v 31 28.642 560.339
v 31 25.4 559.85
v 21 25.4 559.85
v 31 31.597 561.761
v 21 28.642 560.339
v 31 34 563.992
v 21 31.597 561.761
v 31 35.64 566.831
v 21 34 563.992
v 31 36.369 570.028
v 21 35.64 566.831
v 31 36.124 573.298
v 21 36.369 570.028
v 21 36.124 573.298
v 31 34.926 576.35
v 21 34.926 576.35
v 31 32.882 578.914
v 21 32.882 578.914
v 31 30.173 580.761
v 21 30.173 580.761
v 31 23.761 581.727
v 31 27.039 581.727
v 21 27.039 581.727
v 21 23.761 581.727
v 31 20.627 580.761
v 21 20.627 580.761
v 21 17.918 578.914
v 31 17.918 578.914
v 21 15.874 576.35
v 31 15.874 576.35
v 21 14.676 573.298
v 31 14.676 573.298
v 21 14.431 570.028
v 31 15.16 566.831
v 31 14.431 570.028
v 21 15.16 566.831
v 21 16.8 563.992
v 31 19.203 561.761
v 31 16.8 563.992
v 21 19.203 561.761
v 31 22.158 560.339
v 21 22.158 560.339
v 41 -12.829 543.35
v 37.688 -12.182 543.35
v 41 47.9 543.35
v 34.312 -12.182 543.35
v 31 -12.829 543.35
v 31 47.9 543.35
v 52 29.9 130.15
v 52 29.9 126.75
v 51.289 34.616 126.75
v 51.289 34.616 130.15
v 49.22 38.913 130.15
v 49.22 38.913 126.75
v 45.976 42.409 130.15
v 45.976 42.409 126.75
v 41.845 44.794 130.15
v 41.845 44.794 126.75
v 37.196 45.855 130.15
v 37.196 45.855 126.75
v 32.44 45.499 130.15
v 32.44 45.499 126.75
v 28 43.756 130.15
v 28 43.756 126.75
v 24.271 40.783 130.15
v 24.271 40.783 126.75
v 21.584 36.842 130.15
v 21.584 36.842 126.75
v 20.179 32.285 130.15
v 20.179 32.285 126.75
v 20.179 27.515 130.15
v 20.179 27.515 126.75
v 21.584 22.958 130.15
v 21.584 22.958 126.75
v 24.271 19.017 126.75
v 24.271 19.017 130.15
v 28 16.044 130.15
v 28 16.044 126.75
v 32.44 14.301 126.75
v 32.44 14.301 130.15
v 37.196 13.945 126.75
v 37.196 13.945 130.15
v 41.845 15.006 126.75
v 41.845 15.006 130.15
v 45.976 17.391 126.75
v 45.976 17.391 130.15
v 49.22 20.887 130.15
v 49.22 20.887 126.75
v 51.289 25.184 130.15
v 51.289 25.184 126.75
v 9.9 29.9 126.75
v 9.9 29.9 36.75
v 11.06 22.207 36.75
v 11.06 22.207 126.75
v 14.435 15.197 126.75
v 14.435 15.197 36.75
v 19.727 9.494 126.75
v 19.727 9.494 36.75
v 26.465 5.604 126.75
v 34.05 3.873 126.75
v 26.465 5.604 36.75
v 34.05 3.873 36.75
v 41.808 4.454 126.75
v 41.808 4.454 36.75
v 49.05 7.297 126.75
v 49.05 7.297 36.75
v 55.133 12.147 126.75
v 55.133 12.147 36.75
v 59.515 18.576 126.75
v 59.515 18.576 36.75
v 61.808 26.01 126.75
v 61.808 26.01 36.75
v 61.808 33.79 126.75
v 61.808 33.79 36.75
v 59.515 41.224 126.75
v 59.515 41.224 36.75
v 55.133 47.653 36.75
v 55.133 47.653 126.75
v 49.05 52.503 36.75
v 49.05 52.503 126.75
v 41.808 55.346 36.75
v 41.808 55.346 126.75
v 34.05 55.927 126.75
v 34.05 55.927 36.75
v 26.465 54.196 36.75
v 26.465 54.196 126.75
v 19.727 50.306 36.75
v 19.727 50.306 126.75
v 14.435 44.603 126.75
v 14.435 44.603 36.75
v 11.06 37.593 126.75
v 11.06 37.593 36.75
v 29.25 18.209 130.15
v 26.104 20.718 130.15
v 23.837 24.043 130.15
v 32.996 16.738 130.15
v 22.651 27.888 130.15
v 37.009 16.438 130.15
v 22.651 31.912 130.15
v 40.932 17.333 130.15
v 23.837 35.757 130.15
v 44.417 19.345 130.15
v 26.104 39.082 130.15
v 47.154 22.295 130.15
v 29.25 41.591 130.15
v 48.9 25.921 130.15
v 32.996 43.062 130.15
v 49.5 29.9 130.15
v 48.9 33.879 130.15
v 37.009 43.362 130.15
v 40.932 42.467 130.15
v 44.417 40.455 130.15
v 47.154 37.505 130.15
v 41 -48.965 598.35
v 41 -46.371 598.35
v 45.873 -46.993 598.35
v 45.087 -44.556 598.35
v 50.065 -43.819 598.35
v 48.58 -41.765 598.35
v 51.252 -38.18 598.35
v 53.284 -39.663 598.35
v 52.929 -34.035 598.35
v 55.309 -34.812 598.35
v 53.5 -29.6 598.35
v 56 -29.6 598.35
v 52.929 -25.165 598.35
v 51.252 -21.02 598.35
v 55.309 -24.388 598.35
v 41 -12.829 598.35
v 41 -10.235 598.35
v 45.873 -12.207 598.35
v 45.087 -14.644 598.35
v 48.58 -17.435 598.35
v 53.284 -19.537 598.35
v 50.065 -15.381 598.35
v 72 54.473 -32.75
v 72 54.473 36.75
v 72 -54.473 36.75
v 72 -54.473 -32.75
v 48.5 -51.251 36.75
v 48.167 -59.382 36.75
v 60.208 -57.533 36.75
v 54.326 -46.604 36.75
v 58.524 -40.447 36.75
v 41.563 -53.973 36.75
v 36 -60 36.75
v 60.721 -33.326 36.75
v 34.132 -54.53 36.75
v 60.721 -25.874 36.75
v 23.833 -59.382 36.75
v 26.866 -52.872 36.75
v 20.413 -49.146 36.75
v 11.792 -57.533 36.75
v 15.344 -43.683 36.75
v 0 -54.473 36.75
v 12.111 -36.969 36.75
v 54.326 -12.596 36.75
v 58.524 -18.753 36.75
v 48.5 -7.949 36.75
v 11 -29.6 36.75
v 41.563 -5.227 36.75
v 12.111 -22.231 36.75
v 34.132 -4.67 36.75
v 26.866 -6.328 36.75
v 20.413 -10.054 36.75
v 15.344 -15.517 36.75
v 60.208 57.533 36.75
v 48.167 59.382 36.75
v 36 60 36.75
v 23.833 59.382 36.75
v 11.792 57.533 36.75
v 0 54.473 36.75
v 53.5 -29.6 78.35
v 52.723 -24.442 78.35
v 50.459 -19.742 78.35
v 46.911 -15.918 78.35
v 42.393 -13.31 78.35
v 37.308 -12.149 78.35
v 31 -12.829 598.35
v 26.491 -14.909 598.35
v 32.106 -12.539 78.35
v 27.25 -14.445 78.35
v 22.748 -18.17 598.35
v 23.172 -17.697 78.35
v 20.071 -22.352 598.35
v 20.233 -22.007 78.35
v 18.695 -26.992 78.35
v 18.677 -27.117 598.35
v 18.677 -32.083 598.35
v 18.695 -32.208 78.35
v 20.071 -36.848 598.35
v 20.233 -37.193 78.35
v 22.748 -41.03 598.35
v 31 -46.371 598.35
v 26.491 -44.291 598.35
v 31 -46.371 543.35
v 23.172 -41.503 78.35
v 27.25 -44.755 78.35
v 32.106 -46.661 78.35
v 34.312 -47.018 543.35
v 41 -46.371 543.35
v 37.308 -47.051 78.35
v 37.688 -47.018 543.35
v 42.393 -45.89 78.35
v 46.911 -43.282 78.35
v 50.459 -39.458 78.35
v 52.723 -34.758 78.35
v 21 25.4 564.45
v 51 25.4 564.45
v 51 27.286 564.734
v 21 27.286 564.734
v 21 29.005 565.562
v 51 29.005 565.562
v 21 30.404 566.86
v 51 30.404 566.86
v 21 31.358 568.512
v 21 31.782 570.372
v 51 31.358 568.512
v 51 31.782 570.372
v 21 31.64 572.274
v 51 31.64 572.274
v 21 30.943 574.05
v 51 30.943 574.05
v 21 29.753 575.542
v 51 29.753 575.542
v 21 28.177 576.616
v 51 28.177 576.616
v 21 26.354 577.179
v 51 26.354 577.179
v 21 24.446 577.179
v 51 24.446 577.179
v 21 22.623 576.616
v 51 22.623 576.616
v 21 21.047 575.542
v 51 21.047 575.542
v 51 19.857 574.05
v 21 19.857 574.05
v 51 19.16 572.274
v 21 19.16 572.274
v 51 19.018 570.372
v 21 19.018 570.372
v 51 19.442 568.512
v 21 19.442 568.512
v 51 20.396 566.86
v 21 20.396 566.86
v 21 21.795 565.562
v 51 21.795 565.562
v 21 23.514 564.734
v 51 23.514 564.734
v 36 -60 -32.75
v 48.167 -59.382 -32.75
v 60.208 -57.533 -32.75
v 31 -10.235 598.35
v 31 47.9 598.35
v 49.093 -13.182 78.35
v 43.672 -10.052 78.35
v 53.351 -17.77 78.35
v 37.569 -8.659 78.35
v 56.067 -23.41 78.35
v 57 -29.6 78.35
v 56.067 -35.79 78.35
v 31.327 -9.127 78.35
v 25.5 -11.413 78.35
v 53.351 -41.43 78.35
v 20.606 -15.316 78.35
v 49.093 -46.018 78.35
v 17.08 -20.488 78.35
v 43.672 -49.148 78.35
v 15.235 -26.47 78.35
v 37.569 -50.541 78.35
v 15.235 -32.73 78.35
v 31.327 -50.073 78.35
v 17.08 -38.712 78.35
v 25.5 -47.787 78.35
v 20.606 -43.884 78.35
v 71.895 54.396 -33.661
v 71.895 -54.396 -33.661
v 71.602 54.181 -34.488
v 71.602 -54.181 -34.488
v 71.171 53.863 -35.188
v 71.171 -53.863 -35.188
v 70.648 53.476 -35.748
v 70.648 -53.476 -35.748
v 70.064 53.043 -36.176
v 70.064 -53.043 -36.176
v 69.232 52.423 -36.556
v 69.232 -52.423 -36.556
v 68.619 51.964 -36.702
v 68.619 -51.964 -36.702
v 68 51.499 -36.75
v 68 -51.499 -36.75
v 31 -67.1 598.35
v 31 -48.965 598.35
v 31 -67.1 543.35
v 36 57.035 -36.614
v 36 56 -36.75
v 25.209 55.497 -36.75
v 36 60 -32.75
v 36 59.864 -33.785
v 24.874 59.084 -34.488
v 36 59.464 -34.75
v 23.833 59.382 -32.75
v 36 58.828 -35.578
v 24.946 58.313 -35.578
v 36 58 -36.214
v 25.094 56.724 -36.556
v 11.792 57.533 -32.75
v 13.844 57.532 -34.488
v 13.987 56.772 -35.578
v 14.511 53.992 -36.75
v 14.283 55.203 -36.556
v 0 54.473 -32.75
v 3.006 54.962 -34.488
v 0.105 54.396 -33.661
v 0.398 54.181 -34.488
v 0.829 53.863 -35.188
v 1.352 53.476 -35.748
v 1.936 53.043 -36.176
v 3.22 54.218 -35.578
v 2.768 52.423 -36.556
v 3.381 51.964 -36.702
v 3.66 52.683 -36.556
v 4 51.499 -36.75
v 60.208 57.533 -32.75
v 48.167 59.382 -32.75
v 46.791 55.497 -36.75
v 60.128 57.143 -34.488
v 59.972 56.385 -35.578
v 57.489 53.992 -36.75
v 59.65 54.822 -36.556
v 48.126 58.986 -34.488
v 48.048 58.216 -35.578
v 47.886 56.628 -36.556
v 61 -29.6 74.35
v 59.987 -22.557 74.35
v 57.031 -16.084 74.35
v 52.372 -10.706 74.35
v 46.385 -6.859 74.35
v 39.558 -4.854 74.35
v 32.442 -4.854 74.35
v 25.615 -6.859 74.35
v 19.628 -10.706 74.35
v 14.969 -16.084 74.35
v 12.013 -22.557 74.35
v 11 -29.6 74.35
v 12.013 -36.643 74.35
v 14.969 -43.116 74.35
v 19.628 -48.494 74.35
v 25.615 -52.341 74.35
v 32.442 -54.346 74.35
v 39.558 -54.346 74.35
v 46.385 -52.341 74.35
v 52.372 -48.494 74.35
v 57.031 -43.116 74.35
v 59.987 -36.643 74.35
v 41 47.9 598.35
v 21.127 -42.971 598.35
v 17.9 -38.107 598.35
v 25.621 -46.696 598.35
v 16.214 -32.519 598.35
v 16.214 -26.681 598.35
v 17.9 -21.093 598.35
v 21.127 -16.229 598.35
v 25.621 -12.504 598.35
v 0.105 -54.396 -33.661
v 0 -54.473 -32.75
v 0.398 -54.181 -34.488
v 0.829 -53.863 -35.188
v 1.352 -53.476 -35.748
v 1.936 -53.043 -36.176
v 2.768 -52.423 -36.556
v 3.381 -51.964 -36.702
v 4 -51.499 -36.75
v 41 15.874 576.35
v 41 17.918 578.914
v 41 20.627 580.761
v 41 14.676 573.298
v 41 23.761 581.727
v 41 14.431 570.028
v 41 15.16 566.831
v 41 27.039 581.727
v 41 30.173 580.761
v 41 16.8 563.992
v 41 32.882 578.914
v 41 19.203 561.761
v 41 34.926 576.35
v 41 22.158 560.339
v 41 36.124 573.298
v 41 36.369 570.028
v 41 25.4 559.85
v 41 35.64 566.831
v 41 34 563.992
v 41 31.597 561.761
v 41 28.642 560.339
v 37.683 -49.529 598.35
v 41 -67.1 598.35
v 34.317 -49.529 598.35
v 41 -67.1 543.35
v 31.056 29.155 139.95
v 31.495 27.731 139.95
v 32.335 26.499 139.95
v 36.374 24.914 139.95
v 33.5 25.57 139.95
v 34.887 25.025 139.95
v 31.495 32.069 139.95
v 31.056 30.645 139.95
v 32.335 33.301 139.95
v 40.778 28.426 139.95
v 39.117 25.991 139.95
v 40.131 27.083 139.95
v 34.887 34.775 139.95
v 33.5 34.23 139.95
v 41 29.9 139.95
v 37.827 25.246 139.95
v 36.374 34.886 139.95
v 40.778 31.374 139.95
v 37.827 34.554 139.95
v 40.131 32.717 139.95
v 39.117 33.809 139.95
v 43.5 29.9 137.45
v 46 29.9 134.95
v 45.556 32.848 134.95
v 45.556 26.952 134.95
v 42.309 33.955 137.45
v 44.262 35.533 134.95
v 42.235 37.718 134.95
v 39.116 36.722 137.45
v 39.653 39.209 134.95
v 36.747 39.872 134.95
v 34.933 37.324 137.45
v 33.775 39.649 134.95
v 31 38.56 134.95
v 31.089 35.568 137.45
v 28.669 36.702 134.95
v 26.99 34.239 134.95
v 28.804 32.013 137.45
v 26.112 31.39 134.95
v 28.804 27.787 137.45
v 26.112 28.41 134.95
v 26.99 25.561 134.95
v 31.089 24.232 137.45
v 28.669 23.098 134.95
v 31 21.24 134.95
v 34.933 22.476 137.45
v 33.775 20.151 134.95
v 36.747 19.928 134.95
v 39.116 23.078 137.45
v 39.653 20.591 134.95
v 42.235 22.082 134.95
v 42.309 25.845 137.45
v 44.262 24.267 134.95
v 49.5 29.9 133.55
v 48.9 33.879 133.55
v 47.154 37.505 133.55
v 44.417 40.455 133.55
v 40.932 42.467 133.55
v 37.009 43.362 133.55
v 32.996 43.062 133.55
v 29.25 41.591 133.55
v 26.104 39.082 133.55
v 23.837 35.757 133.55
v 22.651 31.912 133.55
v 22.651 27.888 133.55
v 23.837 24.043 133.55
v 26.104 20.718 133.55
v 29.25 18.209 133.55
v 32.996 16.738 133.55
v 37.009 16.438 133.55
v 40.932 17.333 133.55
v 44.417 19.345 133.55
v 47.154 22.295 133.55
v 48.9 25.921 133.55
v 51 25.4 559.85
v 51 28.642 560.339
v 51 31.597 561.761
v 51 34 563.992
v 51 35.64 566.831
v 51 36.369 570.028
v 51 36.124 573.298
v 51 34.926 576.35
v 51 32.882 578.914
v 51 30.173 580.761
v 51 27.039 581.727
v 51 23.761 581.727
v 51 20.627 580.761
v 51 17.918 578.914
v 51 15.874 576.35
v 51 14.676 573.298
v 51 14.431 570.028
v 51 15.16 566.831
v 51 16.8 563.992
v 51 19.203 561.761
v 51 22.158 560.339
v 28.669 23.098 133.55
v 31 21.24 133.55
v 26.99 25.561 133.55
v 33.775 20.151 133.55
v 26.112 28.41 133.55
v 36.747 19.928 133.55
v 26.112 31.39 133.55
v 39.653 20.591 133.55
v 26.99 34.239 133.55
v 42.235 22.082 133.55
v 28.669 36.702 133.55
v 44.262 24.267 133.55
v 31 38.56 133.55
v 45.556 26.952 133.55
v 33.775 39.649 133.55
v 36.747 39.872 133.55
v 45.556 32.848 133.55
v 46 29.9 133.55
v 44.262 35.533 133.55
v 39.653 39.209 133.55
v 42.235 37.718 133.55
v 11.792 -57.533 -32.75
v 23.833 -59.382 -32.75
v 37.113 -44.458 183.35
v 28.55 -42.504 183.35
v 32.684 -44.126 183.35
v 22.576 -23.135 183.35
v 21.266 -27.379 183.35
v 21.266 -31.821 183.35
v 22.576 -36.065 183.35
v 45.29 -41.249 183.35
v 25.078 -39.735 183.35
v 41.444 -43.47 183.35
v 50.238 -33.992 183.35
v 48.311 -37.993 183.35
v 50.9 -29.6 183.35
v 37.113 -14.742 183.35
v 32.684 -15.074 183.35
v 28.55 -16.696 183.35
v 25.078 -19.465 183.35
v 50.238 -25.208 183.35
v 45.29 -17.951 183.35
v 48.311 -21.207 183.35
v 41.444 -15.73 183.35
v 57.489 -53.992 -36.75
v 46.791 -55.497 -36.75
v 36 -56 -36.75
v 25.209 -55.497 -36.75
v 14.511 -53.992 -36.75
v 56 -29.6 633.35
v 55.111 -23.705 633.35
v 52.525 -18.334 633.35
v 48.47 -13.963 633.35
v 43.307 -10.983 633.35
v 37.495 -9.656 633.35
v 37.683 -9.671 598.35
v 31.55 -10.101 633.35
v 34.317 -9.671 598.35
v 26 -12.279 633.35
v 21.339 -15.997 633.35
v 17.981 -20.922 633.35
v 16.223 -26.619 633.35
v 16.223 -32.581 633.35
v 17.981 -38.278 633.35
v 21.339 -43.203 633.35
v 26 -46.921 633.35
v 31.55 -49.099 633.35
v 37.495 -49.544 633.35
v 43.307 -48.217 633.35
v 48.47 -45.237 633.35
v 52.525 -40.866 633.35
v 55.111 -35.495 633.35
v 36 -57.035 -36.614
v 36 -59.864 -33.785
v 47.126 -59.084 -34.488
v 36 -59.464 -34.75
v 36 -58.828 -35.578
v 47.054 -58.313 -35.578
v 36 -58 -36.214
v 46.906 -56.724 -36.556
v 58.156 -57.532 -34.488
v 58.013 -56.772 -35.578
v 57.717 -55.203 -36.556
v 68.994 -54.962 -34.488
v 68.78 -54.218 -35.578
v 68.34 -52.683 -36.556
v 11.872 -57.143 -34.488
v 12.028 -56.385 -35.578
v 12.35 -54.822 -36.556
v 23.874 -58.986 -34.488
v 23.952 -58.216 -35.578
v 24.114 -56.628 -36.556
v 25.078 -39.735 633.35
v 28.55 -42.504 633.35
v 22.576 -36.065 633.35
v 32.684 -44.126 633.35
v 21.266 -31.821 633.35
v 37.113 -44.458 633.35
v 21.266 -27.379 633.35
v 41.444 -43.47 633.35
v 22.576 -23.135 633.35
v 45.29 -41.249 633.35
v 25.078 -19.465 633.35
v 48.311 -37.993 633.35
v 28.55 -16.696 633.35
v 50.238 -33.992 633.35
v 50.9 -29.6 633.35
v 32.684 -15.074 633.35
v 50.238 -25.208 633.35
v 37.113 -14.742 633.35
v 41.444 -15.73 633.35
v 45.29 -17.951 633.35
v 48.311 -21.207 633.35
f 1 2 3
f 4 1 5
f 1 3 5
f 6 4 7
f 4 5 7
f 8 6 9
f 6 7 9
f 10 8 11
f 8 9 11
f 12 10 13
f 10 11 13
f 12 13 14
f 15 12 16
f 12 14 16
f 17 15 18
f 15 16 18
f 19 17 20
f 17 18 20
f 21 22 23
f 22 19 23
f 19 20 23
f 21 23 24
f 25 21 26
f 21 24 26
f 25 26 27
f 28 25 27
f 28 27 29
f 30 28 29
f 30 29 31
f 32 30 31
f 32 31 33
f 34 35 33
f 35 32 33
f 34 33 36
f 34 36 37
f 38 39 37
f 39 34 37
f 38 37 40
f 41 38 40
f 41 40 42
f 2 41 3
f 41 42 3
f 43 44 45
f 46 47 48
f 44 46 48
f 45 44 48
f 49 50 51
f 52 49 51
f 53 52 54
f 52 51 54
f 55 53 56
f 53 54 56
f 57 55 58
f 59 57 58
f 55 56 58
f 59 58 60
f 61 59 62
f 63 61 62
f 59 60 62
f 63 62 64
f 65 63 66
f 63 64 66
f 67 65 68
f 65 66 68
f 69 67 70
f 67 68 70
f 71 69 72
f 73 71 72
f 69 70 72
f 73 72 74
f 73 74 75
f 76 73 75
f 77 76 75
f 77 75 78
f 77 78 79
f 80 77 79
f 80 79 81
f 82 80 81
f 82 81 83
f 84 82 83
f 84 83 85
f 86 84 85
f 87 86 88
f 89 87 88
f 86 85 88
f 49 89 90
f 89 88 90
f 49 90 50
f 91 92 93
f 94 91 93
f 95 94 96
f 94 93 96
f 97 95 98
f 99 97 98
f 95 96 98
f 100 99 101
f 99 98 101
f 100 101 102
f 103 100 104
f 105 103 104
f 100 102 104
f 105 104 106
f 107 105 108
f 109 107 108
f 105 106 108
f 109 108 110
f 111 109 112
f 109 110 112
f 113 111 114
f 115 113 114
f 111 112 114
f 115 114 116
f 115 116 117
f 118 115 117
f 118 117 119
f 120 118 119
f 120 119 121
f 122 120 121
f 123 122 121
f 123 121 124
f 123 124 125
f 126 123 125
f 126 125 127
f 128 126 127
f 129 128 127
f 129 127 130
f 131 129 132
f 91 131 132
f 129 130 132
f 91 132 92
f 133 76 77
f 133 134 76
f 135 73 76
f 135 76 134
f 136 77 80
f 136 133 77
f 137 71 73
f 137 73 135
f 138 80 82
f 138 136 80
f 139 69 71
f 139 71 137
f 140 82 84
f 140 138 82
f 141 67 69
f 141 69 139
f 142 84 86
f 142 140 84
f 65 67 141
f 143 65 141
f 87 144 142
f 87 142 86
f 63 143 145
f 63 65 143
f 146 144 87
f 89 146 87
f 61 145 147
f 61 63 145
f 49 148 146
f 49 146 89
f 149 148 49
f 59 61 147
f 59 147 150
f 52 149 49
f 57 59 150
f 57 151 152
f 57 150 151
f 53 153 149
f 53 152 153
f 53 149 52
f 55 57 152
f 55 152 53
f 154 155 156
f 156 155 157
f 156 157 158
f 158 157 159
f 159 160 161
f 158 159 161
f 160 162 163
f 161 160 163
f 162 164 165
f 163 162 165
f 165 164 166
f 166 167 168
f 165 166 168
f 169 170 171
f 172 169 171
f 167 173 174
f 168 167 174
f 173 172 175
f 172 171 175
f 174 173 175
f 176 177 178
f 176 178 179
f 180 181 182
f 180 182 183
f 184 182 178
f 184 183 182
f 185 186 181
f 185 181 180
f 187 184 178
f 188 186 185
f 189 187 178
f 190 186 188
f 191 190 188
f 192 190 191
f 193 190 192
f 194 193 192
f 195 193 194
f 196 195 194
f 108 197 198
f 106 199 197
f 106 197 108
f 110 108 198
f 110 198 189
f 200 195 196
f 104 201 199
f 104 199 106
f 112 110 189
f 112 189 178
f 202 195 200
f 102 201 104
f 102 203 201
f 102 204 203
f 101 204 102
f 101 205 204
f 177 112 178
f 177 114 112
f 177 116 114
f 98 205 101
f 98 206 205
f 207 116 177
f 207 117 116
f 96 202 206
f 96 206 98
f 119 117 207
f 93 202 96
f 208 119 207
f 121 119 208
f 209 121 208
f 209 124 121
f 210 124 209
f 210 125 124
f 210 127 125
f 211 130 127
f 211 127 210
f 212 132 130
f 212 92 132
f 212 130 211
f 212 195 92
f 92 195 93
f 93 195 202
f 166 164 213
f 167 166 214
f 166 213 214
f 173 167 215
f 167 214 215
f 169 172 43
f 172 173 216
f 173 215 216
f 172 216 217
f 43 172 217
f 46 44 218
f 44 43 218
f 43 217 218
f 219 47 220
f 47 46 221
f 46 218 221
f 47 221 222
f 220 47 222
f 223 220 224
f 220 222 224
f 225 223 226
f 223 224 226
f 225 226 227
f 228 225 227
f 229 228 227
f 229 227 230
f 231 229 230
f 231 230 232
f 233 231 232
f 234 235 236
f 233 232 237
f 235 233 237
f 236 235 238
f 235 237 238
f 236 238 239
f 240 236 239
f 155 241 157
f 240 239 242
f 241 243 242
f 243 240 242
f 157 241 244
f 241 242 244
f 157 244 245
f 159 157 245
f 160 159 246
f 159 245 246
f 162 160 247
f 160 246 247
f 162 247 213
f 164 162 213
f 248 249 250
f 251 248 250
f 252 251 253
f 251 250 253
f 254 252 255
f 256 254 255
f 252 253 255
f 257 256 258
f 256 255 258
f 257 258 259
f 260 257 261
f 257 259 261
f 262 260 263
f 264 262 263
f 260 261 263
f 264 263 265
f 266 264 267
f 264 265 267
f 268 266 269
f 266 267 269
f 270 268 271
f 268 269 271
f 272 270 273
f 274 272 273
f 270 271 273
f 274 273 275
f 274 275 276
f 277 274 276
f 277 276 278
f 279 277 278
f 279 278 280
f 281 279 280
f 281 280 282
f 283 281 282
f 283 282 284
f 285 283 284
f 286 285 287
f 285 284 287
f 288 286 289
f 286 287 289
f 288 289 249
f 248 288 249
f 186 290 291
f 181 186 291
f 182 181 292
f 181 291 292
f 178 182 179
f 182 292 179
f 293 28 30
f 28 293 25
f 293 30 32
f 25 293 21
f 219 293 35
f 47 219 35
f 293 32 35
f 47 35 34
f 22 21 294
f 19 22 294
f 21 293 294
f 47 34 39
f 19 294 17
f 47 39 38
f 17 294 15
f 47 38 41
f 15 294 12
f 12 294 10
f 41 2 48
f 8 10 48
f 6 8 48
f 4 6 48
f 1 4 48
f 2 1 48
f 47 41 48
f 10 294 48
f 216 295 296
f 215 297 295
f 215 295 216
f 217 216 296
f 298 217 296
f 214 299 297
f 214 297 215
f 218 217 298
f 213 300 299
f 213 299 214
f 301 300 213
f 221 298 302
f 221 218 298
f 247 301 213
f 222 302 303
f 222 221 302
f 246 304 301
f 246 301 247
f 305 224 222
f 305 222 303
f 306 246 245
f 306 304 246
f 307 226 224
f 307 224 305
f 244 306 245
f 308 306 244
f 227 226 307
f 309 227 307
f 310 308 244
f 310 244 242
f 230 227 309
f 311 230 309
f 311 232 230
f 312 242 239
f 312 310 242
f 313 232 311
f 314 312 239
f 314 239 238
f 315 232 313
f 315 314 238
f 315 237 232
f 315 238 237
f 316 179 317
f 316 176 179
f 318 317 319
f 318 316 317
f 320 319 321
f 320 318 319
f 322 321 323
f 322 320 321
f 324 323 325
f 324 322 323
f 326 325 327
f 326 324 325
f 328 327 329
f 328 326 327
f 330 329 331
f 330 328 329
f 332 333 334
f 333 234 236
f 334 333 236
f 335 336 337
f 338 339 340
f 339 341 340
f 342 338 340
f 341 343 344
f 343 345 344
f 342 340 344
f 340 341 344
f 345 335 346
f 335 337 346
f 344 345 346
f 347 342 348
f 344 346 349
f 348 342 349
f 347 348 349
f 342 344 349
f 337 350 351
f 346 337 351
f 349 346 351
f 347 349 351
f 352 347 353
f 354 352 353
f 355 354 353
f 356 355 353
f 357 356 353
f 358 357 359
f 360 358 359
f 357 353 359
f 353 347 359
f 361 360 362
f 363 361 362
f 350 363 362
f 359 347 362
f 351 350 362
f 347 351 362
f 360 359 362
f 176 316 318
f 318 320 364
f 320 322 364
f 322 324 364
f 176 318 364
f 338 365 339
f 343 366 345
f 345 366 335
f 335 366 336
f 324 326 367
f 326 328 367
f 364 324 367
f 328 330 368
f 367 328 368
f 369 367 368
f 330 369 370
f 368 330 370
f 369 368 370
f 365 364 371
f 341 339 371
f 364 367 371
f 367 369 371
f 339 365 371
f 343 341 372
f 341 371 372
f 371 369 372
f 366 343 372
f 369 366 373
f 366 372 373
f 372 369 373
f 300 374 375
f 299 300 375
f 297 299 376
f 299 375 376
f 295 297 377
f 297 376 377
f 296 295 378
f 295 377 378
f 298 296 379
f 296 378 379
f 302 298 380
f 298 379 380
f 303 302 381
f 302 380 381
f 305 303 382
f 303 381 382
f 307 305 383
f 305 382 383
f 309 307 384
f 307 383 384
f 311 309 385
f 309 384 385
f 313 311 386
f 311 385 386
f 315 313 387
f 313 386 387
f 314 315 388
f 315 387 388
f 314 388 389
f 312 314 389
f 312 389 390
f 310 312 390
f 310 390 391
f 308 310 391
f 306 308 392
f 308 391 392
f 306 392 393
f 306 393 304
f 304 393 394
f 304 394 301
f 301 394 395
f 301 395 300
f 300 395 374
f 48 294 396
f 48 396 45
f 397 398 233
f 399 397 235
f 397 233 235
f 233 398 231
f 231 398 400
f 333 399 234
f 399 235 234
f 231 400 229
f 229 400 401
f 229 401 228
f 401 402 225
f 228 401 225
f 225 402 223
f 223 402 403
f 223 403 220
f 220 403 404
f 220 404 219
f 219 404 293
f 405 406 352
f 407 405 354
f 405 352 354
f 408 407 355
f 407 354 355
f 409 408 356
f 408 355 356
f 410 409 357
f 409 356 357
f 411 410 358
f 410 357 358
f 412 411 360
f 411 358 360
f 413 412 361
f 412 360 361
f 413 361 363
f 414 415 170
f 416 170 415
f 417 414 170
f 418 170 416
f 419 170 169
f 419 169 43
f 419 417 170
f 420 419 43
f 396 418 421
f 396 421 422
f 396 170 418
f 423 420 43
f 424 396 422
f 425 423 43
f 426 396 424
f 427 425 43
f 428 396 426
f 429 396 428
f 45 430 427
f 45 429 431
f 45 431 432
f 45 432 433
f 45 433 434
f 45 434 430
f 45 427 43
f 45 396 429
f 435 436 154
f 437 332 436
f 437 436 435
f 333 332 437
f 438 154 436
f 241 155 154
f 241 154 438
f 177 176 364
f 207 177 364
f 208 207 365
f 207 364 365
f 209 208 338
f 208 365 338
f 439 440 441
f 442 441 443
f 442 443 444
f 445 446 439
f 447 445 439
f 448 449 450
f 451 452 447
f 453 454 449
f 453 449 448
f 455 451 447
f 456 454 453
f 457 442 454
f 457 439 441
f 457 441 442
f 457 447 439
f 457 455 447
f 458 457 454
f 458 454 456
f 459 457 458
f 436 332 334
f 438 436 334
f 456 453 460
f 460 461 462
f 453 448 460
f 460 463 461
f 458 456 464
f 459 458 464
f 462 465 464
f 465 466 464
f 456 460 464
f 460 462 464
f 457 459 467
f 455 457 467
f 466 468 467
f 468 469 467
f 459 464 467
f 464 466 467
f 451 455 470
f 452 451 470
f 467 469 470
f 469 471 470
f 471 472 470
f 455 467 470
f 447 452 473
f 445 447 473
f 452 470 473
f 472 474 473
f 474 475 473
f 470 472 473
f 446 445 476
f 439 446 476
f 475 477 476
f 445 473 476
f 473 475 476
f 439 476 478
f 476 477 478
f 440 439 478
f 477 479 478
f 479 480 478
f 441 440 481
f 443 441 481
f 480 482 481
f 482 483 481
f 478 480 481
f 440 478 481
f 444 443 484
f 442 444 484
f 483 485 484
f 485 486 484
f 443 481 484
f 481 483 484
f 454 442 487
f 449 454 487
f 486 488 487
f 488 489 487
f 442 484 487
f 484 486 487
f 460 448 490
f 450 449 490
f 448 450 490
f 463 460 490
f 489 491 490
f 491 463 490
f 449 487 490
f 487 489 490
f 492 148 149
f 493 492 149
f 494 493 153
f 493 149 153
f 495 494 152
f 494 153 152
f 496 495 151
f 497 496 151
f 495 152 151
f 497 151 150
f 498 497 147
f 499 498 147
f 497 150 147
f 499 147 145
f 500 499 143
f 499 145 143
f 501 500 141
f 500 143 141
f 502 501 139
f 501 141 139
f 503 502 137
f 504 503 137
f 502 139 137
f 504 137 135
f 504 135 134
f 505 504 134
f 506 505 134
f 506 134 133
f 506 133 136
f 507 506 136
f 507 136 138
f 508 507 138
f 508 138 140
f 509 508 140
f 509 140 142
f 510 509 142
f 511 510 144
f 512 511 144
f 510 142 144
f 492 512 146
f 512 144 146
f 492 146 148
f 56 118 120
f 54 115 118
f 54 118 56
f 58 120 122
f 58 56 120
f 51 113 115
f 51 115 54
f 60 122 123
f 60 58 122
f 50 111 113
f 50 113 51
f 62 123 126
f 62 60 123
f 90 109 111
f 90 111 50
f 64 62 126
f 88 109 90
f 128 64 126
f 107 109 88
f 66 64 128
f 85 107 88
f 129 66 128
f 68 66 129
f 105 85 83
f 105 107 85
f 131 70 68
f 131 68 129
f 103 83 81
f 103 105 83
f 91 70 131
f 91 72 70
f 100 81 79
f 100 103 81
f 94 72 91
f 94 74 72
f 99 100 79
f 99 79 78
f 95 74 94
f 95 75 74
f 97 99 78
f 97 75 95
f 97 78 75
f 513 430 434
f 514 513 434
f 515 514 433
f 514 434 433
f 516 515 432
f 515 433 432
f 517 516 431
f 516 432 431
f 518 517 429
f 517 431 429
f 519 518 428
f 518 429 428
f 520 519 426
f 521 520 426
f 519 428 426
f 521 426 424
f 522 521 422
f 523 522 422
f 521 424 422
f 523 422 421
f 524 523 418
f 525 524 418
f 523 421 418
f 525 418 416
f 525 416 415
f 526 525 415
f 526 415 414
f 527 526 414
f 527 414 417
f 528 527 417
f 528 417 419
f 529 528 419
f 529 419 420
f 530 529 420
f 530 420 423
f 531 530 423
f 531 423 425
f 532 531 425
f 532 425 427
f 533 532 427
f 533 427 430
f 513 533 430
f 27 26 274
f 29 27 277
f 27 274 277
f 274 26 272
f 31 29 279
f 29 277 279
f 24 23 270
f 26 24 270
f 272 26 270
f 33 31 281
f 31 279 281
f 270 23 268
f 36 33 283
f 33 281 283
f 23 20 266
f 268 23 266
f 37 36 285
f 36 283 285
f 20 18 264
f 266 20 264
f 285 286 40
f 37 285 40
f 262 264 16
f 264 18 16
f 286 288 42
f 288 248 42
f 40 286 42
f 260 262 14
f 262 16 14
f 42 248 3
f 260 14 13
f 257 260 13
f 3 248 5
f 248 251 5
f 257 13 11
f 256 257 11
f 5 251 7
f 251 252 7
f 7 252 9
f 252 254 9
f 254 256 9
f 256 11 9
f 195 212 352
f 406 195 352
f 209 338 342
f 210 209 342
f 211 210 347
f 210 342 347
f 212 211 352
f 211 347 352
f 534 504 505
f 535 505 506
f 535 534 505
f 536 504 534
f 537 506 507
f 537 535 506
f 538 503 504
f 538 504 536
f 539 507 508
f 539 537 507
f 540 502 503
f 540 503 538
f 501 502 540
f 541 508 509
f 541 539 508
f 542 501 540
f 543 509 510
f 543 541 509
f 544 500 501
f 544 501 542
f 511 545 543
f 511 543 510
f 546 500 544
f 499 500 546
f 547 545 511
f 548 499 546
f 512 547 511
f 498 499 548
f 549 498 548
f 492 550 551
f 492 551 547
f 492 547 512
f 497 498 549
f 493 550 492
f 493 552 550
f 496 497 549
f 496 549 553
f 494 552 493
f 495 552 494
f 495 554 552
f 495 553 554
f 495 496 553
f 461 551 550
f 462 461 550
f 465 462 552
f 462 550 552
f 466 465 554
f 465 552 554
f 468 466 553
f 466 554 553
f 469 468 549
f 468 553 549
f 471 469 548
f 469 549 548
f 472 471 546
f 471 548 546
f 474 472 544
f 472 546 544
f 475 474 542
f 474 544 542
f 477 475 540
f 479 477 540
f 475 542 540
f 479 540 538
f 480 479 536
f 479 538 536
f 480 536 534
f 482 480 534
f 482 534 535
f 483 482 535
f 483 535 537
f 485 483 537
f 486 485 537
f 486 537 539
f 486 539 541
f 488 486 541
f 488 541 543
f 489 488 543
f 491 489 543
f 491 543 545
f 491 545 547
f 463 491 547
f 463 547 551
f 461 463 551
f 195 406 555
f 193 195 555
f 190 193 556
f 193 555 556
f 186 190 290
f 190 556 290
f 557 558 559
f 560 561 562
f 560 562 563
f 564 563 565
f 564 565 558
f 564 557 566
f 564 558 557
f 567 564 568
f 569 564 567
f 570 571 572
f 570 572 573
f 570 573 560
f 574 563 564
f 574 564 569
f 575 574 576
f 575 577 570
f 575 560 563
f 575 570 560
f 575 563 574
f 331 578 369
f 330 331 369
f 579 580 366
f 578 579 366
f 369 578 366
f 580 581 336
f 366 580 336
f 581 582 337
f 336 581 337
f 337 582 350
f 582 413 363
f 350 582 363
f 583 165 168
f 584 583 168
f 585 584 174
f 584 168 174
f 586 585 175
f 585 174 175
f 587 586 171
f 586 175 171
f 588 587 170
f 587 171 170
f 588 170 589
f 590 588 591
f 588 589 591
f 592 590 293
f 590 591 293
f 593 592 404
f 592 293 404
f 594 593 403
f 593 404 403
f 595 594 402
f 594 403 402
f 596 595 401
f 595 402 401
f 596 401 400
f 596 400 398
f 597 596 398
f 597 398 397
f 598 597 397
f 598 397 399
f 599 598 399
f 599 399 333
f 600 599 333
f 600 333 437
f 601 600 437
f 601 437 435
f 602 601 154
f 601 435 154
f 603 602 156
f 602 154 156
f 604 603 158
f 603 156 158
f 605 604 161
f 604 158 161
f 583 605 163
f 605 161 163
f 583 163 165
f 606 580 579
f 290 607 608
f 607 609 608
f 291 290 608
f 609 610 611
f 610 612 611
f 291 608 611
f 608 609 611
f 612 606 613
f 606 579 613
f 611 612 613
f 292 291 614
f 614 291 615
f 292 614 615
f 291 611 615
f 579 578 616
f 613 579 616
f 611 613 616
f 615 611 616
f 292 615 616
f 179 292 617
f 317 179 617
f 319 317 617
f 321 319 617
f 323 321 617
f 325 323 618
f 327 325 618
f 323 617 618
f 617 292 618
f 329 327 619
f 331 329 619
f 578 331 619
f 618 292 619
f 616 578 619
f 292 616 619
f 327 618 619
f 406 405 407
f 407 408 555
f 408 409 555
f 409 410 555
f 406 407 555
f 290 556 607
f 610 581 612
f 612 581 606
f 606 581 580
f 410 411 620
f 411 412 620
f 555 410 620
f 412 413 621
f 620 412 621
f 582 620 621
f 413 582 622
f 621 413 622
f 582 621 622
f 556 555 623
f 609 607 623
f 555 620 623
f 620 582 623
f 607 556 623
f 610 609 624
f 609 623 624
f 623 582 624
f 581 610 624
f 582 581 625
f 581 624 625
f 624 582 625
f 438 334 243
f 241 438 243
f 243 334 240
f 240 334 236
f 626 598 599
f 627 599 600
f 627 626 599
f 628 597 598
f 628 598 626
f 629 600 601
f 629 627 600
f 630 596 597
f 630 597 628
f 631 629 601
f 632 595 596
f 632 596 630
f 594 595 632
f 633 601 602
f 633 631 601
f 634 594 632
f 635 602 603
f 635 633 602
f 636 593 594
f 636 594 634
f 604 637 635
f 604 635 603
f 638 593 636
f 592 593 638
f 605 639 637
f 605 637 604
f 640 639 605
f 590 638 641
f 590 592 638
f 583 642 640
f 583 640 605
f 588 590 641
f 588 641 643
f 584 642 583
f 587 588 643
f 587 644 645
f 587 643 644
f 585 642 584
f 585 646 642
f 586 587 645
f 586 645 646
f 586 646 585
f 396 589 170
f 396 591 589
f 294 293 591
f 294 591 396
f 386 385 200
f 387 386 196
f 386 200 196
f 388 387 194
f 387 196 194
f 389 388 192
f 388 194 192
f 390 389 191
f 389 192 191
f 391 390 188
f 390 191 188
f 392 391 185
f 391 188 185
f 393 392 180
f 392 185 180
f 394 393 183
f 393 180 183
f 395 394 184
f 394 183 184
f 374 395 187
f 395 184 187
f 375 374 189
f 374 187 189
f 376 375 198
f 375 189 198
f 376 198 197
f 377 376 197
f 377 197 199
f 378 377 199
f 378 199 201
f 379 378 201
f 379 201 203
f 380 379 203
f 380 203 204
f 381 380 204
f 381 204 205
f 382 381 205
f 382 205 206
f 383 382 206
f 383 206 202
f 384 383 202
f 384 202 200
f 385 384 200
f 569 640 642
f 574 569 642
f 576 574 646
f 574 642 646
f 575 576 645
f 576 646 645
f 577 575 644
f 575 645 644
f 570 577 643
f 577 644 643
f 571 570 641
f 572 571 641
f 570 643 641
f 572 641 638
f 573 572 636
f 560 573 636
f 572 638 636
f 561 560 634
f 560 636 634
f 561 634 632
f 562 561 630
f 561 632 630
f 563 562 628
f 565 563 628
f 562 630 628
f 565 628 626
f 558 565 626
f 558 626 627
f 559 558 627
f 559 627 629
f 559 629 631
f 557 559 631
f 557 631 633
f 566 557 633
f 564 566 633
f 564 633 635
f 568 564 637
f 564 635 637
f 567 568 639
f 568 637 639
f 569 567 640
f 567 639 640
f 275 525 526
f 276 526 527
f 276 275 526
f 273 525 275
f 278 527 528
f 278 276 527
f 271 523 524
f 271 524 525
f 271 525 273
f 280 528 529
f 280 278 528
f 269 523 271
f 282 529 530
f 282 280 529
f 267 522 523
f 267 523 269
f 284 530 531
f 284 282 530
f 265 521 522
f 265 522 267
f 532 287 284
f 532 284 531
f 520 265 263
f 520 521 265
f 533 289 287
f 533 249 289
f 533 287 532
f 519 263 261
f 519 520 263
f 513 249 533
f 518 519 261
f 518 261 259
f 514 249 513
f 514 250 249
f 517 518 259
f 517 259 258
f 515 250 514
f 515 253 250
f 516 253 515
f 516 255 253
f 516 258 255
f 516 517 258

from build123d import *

# Parameters (mm, degrees)
CROQUIS1_W                    = 73.5
CROQUIS1_H                    = 120
SALIENTE_EXTRUIR1_DEPTH       = 72
CROQUIS2_R                    = 26.1
SALIENTE_EXTRUIR2_DEPTH       = 90
CROQUIS3_R                    = 16
SALIENTE_EXTRUIR3_DEPTH       = 3.4
CROQUIS4_R                    = 13.5
SALIENTE_EXTRUIR4_DEPTH       = 3.4
CROQUIS5_R                    = 10
SALIENTE_EXTRUIR5_DEPTH       = 6.4
CHAFL_N1_SIZE                 = 5
CROQUIS6_R                    = 25
SALIENTE_EXTRUIR6_DEPTH       = 41.6
CROQUIS7_R                    = 17.5
SALIENTE_EXTRUIR7_DEPTH       = 520
CHAFL_N2_SIZE                 = 4
CROQUIS8_R                    = 20
SALIENTE_EXTRUIR8_DEPTH       = 35
SALIENTE_EXTRUIR11_DEPTH      = 5
SALIENTE_EXTRUIR11_DEPTH_BACK = 5
CROQUIS11_W                   = 55
CROQUIS11_H                   = 115
CROQUIS9_R                    = 14.9
CORTAR_EXTRUIR1_DEPTH         = 450
SALIENTE_EXTRUIR12_DEPTH      = 10
SALIENTE_EXTRUIR12_DEPTH_BACK = 20
CROQUIS12_R                   = 11
CROQUIS13_R                   = 6.4
CORTAR_EXTRUIR2_DEPTH         = 30
CORTAR_EXTRUIR4_DEPTH         = 91
REDONDEO1_R                   = 4


with BuildPart() as part:
    # Croquis1 → Saliente-Extruir1 (new body)
    with BuildSketch(Plane(origin=(0, 0, 0), x_dir=(0, 0, -1), z_dir=(1, 0, 0))):
        Rectangle(CROQUIS1_W, CROQUIS1_H)
    extrude(amount=SALIENTE_EXTRUIR1_DEPTH)

    # Croquis2 → Saliente-Extruir2 (add)
    with BuildSketch(Plane.XY.offset(36.75)):
        with Locations((36, 29.9)):
            Circle(CROQUIS2_R)
    extrude(amount=SALIENTE_EXTRUIR2_DEPTH)

    # Croquis3 → Saliente-Extruir3 (add)
    with BuildSketch(Plane.XY.offset(126.75)):
        with Locations((36, 29.9)):
            Circle(CROQUIS3_R)
    extrude(amount=SALIENTE_EXTRUIR3_DEPTH)

    # Croquis4 → Saliente-Extruir4 (add)
    with BuildSketch(Plane.XY.offset(130.15)):
        with Locations((36, 29.9)):
            Circle(CROQUIS4_R)
    extrude(amount=SALIENTE_EXTRUIR4_DEPTH)

    # Croquis5 → Saliente-Extruir5 (add)
    with BuildSketch(Plane.XY.offset(133.55)):
        with Locations((36, 29.9)):
            Circle(CROQUIS5_R)
    extrude(amount=SALIENTE_EXTRUIR5_DEPTH)

    # Chaflán1
    chafl_n1_edges = [part.edges().sort_by_distance(p)[0] for p in [
        (26, 29.9, 139.95),
    ]]
    chamfer(chafl_n1_edges, length=CHAFL_N1_SIZE)

    # Croquis6 → Saliente-Extruir6 (add)
    with BuildSketch(Plane.XY.offset(36.75)):
        with Locations((36, -29.6)):
            Circle(CROQUIS6_R)
    extrude(amount=SALIENTE_EXTRUIR6_DEPTH)

    # Croquis7 → Saliente-Extruir7 (add)
    with BuildSketch(Plane.XY.offset(78.35)):
        with Locations((36, -29.6)):
            Circle(CROQUIS7_R)
    extrude(amount=SALIENTE_EXTRUIR7_DEPTH)

    # Chaflán2
    chafl_n2_edges = [part.edges().sort_by_distance(p)[0] for p in [
        (11, -29.6, 78.35),
    ]]
    chamfer(chafl_n2_edges, length=CHAFL_N2_SIZE)

    # Croquis8 → Saliente-Extruir8 (add)
    with BuildSketch(Plane.XY.offset(598.35)):
        with Locations((36, -29.6)):
            Circle(CROQUIS8_R)
    extrude(amount=SALIENTE_EXTRUIR8_DEPTH)

    # Croquis11 → Saliente-Extruir11 (add, two sides: drawn at the far end of the back side and taken through both)
    with BuildSketch(Plane(origin=(36, 0, 0), x_dir=(0, 0, -1), z_dir=(1, 0, 0)).offset(-SALIENTE_EXTRUIR11_DEPTH_BACK)):
        with Locations((-570.85, -9.6)):
            Rectangle(CROQUIS11_W, CROQUIS11_H)
    extrude(amount=SALIENTE_EXTRUIR11_DEPTH + SALIENTE_EXTRUIR11_DEPTH_BACK)

    # Croquis9 → Cortar-Extruir1 (cut)
    with BuildSketch(Plane.XY.offset(633.35)):
        with Locations((36, -29.6)):
            Circle(CROQUIS9_R)
    extrude(amount=-CORTAR_EXTRUIR1_DEPTH, mode=Mode.SUBTRACT)

    # Croquis12 → Saliente-Extruir12 (add, two sides: drawn at the far end of the back side and taken through both)
    with BuildSketch(Plane(origin=(41, 0, 0), x_dir=(0, 0, -1), z_dir=(1, 0, 0)).offset(-SALIENTE_EXTRUIR12_DEPTH_BACK)):
        with Locations((-570.85, 25.4)):
            Circle(CROQUIS12_R)
    extrude(amount=SALIENTE_EXTRUIR12_DEPTH + SALIENTE_EXTRUIR12_DEPTH_BACK)

    # Croquis13 → Cortar-Extruir2 (cut)
    with BuildSketch(Plane(origin=(51, 0, 0), x_dir=(0, 0, -1), z_dir=(1, 0, 0))):
        with Locations((-570.85, 25.4)):
            Circle(CROQUIS13_R)
    extrude(amount=-CORTAR_EXTRUIR2_DEPTH, mode=Mode.SUBTRACT)

    # Croquis14 → Cortar-Extruir4 (cut)
    with BuildSketch(Plane(origin=(0, 0, -36.75), x_dir=(-1, 0, 0), z_dir=(0, 0, -1))):
        with BuildLine():
            ThreePointArc((-36, 60), (-17.789076086, 58.610127098), (0, 54.47270417))
            Line((0, 54.47270417), (0, 60))
            Line((0, 60), (-36, 60))
        make_face()
        with BuildLine():
            Line((0, -60), (0, -54.47270417))
            ThreePointArc((0, -54.47270417), (-17.789076086, -58.610127098), (-36, -60))
            Line((-36, -60), (0, -60))
        make_face()
        with BuildLine():
            Line((-72, 60), (-72, 54.47270417))
            ThreePointArc((-72, 54.47270417), (-54.210923914, 58.610127098), (-36, 60))
            Line((-36, 60), (-72, 60))
        make_face()
        with BuildLine():
            ThreePointArc((-36, -60), (-54.210923914, -58.610127098), (-72, -54.47270417))
            Line((-72, -54.47270417), (-72, -60))
            Line((-72, -60), (-36, -60))
        make_face()
    extrude(amount=-CORTAR_EXTRUIR4_DEPTH, mode=Mode.SUBTRACT)

    # Redondeo1
    redondeo1_edges = [part.edges().sort_by_distance(p)[0] for p in [
        (0, 0, -36.75),
        (36, -60, -36.75),
        (72, 0, -36.75),
        (36, 60, -36.75),
    ]]
    fillet(redondeo1_edges, radius=REDONDEO1_R)


solid = part.part
